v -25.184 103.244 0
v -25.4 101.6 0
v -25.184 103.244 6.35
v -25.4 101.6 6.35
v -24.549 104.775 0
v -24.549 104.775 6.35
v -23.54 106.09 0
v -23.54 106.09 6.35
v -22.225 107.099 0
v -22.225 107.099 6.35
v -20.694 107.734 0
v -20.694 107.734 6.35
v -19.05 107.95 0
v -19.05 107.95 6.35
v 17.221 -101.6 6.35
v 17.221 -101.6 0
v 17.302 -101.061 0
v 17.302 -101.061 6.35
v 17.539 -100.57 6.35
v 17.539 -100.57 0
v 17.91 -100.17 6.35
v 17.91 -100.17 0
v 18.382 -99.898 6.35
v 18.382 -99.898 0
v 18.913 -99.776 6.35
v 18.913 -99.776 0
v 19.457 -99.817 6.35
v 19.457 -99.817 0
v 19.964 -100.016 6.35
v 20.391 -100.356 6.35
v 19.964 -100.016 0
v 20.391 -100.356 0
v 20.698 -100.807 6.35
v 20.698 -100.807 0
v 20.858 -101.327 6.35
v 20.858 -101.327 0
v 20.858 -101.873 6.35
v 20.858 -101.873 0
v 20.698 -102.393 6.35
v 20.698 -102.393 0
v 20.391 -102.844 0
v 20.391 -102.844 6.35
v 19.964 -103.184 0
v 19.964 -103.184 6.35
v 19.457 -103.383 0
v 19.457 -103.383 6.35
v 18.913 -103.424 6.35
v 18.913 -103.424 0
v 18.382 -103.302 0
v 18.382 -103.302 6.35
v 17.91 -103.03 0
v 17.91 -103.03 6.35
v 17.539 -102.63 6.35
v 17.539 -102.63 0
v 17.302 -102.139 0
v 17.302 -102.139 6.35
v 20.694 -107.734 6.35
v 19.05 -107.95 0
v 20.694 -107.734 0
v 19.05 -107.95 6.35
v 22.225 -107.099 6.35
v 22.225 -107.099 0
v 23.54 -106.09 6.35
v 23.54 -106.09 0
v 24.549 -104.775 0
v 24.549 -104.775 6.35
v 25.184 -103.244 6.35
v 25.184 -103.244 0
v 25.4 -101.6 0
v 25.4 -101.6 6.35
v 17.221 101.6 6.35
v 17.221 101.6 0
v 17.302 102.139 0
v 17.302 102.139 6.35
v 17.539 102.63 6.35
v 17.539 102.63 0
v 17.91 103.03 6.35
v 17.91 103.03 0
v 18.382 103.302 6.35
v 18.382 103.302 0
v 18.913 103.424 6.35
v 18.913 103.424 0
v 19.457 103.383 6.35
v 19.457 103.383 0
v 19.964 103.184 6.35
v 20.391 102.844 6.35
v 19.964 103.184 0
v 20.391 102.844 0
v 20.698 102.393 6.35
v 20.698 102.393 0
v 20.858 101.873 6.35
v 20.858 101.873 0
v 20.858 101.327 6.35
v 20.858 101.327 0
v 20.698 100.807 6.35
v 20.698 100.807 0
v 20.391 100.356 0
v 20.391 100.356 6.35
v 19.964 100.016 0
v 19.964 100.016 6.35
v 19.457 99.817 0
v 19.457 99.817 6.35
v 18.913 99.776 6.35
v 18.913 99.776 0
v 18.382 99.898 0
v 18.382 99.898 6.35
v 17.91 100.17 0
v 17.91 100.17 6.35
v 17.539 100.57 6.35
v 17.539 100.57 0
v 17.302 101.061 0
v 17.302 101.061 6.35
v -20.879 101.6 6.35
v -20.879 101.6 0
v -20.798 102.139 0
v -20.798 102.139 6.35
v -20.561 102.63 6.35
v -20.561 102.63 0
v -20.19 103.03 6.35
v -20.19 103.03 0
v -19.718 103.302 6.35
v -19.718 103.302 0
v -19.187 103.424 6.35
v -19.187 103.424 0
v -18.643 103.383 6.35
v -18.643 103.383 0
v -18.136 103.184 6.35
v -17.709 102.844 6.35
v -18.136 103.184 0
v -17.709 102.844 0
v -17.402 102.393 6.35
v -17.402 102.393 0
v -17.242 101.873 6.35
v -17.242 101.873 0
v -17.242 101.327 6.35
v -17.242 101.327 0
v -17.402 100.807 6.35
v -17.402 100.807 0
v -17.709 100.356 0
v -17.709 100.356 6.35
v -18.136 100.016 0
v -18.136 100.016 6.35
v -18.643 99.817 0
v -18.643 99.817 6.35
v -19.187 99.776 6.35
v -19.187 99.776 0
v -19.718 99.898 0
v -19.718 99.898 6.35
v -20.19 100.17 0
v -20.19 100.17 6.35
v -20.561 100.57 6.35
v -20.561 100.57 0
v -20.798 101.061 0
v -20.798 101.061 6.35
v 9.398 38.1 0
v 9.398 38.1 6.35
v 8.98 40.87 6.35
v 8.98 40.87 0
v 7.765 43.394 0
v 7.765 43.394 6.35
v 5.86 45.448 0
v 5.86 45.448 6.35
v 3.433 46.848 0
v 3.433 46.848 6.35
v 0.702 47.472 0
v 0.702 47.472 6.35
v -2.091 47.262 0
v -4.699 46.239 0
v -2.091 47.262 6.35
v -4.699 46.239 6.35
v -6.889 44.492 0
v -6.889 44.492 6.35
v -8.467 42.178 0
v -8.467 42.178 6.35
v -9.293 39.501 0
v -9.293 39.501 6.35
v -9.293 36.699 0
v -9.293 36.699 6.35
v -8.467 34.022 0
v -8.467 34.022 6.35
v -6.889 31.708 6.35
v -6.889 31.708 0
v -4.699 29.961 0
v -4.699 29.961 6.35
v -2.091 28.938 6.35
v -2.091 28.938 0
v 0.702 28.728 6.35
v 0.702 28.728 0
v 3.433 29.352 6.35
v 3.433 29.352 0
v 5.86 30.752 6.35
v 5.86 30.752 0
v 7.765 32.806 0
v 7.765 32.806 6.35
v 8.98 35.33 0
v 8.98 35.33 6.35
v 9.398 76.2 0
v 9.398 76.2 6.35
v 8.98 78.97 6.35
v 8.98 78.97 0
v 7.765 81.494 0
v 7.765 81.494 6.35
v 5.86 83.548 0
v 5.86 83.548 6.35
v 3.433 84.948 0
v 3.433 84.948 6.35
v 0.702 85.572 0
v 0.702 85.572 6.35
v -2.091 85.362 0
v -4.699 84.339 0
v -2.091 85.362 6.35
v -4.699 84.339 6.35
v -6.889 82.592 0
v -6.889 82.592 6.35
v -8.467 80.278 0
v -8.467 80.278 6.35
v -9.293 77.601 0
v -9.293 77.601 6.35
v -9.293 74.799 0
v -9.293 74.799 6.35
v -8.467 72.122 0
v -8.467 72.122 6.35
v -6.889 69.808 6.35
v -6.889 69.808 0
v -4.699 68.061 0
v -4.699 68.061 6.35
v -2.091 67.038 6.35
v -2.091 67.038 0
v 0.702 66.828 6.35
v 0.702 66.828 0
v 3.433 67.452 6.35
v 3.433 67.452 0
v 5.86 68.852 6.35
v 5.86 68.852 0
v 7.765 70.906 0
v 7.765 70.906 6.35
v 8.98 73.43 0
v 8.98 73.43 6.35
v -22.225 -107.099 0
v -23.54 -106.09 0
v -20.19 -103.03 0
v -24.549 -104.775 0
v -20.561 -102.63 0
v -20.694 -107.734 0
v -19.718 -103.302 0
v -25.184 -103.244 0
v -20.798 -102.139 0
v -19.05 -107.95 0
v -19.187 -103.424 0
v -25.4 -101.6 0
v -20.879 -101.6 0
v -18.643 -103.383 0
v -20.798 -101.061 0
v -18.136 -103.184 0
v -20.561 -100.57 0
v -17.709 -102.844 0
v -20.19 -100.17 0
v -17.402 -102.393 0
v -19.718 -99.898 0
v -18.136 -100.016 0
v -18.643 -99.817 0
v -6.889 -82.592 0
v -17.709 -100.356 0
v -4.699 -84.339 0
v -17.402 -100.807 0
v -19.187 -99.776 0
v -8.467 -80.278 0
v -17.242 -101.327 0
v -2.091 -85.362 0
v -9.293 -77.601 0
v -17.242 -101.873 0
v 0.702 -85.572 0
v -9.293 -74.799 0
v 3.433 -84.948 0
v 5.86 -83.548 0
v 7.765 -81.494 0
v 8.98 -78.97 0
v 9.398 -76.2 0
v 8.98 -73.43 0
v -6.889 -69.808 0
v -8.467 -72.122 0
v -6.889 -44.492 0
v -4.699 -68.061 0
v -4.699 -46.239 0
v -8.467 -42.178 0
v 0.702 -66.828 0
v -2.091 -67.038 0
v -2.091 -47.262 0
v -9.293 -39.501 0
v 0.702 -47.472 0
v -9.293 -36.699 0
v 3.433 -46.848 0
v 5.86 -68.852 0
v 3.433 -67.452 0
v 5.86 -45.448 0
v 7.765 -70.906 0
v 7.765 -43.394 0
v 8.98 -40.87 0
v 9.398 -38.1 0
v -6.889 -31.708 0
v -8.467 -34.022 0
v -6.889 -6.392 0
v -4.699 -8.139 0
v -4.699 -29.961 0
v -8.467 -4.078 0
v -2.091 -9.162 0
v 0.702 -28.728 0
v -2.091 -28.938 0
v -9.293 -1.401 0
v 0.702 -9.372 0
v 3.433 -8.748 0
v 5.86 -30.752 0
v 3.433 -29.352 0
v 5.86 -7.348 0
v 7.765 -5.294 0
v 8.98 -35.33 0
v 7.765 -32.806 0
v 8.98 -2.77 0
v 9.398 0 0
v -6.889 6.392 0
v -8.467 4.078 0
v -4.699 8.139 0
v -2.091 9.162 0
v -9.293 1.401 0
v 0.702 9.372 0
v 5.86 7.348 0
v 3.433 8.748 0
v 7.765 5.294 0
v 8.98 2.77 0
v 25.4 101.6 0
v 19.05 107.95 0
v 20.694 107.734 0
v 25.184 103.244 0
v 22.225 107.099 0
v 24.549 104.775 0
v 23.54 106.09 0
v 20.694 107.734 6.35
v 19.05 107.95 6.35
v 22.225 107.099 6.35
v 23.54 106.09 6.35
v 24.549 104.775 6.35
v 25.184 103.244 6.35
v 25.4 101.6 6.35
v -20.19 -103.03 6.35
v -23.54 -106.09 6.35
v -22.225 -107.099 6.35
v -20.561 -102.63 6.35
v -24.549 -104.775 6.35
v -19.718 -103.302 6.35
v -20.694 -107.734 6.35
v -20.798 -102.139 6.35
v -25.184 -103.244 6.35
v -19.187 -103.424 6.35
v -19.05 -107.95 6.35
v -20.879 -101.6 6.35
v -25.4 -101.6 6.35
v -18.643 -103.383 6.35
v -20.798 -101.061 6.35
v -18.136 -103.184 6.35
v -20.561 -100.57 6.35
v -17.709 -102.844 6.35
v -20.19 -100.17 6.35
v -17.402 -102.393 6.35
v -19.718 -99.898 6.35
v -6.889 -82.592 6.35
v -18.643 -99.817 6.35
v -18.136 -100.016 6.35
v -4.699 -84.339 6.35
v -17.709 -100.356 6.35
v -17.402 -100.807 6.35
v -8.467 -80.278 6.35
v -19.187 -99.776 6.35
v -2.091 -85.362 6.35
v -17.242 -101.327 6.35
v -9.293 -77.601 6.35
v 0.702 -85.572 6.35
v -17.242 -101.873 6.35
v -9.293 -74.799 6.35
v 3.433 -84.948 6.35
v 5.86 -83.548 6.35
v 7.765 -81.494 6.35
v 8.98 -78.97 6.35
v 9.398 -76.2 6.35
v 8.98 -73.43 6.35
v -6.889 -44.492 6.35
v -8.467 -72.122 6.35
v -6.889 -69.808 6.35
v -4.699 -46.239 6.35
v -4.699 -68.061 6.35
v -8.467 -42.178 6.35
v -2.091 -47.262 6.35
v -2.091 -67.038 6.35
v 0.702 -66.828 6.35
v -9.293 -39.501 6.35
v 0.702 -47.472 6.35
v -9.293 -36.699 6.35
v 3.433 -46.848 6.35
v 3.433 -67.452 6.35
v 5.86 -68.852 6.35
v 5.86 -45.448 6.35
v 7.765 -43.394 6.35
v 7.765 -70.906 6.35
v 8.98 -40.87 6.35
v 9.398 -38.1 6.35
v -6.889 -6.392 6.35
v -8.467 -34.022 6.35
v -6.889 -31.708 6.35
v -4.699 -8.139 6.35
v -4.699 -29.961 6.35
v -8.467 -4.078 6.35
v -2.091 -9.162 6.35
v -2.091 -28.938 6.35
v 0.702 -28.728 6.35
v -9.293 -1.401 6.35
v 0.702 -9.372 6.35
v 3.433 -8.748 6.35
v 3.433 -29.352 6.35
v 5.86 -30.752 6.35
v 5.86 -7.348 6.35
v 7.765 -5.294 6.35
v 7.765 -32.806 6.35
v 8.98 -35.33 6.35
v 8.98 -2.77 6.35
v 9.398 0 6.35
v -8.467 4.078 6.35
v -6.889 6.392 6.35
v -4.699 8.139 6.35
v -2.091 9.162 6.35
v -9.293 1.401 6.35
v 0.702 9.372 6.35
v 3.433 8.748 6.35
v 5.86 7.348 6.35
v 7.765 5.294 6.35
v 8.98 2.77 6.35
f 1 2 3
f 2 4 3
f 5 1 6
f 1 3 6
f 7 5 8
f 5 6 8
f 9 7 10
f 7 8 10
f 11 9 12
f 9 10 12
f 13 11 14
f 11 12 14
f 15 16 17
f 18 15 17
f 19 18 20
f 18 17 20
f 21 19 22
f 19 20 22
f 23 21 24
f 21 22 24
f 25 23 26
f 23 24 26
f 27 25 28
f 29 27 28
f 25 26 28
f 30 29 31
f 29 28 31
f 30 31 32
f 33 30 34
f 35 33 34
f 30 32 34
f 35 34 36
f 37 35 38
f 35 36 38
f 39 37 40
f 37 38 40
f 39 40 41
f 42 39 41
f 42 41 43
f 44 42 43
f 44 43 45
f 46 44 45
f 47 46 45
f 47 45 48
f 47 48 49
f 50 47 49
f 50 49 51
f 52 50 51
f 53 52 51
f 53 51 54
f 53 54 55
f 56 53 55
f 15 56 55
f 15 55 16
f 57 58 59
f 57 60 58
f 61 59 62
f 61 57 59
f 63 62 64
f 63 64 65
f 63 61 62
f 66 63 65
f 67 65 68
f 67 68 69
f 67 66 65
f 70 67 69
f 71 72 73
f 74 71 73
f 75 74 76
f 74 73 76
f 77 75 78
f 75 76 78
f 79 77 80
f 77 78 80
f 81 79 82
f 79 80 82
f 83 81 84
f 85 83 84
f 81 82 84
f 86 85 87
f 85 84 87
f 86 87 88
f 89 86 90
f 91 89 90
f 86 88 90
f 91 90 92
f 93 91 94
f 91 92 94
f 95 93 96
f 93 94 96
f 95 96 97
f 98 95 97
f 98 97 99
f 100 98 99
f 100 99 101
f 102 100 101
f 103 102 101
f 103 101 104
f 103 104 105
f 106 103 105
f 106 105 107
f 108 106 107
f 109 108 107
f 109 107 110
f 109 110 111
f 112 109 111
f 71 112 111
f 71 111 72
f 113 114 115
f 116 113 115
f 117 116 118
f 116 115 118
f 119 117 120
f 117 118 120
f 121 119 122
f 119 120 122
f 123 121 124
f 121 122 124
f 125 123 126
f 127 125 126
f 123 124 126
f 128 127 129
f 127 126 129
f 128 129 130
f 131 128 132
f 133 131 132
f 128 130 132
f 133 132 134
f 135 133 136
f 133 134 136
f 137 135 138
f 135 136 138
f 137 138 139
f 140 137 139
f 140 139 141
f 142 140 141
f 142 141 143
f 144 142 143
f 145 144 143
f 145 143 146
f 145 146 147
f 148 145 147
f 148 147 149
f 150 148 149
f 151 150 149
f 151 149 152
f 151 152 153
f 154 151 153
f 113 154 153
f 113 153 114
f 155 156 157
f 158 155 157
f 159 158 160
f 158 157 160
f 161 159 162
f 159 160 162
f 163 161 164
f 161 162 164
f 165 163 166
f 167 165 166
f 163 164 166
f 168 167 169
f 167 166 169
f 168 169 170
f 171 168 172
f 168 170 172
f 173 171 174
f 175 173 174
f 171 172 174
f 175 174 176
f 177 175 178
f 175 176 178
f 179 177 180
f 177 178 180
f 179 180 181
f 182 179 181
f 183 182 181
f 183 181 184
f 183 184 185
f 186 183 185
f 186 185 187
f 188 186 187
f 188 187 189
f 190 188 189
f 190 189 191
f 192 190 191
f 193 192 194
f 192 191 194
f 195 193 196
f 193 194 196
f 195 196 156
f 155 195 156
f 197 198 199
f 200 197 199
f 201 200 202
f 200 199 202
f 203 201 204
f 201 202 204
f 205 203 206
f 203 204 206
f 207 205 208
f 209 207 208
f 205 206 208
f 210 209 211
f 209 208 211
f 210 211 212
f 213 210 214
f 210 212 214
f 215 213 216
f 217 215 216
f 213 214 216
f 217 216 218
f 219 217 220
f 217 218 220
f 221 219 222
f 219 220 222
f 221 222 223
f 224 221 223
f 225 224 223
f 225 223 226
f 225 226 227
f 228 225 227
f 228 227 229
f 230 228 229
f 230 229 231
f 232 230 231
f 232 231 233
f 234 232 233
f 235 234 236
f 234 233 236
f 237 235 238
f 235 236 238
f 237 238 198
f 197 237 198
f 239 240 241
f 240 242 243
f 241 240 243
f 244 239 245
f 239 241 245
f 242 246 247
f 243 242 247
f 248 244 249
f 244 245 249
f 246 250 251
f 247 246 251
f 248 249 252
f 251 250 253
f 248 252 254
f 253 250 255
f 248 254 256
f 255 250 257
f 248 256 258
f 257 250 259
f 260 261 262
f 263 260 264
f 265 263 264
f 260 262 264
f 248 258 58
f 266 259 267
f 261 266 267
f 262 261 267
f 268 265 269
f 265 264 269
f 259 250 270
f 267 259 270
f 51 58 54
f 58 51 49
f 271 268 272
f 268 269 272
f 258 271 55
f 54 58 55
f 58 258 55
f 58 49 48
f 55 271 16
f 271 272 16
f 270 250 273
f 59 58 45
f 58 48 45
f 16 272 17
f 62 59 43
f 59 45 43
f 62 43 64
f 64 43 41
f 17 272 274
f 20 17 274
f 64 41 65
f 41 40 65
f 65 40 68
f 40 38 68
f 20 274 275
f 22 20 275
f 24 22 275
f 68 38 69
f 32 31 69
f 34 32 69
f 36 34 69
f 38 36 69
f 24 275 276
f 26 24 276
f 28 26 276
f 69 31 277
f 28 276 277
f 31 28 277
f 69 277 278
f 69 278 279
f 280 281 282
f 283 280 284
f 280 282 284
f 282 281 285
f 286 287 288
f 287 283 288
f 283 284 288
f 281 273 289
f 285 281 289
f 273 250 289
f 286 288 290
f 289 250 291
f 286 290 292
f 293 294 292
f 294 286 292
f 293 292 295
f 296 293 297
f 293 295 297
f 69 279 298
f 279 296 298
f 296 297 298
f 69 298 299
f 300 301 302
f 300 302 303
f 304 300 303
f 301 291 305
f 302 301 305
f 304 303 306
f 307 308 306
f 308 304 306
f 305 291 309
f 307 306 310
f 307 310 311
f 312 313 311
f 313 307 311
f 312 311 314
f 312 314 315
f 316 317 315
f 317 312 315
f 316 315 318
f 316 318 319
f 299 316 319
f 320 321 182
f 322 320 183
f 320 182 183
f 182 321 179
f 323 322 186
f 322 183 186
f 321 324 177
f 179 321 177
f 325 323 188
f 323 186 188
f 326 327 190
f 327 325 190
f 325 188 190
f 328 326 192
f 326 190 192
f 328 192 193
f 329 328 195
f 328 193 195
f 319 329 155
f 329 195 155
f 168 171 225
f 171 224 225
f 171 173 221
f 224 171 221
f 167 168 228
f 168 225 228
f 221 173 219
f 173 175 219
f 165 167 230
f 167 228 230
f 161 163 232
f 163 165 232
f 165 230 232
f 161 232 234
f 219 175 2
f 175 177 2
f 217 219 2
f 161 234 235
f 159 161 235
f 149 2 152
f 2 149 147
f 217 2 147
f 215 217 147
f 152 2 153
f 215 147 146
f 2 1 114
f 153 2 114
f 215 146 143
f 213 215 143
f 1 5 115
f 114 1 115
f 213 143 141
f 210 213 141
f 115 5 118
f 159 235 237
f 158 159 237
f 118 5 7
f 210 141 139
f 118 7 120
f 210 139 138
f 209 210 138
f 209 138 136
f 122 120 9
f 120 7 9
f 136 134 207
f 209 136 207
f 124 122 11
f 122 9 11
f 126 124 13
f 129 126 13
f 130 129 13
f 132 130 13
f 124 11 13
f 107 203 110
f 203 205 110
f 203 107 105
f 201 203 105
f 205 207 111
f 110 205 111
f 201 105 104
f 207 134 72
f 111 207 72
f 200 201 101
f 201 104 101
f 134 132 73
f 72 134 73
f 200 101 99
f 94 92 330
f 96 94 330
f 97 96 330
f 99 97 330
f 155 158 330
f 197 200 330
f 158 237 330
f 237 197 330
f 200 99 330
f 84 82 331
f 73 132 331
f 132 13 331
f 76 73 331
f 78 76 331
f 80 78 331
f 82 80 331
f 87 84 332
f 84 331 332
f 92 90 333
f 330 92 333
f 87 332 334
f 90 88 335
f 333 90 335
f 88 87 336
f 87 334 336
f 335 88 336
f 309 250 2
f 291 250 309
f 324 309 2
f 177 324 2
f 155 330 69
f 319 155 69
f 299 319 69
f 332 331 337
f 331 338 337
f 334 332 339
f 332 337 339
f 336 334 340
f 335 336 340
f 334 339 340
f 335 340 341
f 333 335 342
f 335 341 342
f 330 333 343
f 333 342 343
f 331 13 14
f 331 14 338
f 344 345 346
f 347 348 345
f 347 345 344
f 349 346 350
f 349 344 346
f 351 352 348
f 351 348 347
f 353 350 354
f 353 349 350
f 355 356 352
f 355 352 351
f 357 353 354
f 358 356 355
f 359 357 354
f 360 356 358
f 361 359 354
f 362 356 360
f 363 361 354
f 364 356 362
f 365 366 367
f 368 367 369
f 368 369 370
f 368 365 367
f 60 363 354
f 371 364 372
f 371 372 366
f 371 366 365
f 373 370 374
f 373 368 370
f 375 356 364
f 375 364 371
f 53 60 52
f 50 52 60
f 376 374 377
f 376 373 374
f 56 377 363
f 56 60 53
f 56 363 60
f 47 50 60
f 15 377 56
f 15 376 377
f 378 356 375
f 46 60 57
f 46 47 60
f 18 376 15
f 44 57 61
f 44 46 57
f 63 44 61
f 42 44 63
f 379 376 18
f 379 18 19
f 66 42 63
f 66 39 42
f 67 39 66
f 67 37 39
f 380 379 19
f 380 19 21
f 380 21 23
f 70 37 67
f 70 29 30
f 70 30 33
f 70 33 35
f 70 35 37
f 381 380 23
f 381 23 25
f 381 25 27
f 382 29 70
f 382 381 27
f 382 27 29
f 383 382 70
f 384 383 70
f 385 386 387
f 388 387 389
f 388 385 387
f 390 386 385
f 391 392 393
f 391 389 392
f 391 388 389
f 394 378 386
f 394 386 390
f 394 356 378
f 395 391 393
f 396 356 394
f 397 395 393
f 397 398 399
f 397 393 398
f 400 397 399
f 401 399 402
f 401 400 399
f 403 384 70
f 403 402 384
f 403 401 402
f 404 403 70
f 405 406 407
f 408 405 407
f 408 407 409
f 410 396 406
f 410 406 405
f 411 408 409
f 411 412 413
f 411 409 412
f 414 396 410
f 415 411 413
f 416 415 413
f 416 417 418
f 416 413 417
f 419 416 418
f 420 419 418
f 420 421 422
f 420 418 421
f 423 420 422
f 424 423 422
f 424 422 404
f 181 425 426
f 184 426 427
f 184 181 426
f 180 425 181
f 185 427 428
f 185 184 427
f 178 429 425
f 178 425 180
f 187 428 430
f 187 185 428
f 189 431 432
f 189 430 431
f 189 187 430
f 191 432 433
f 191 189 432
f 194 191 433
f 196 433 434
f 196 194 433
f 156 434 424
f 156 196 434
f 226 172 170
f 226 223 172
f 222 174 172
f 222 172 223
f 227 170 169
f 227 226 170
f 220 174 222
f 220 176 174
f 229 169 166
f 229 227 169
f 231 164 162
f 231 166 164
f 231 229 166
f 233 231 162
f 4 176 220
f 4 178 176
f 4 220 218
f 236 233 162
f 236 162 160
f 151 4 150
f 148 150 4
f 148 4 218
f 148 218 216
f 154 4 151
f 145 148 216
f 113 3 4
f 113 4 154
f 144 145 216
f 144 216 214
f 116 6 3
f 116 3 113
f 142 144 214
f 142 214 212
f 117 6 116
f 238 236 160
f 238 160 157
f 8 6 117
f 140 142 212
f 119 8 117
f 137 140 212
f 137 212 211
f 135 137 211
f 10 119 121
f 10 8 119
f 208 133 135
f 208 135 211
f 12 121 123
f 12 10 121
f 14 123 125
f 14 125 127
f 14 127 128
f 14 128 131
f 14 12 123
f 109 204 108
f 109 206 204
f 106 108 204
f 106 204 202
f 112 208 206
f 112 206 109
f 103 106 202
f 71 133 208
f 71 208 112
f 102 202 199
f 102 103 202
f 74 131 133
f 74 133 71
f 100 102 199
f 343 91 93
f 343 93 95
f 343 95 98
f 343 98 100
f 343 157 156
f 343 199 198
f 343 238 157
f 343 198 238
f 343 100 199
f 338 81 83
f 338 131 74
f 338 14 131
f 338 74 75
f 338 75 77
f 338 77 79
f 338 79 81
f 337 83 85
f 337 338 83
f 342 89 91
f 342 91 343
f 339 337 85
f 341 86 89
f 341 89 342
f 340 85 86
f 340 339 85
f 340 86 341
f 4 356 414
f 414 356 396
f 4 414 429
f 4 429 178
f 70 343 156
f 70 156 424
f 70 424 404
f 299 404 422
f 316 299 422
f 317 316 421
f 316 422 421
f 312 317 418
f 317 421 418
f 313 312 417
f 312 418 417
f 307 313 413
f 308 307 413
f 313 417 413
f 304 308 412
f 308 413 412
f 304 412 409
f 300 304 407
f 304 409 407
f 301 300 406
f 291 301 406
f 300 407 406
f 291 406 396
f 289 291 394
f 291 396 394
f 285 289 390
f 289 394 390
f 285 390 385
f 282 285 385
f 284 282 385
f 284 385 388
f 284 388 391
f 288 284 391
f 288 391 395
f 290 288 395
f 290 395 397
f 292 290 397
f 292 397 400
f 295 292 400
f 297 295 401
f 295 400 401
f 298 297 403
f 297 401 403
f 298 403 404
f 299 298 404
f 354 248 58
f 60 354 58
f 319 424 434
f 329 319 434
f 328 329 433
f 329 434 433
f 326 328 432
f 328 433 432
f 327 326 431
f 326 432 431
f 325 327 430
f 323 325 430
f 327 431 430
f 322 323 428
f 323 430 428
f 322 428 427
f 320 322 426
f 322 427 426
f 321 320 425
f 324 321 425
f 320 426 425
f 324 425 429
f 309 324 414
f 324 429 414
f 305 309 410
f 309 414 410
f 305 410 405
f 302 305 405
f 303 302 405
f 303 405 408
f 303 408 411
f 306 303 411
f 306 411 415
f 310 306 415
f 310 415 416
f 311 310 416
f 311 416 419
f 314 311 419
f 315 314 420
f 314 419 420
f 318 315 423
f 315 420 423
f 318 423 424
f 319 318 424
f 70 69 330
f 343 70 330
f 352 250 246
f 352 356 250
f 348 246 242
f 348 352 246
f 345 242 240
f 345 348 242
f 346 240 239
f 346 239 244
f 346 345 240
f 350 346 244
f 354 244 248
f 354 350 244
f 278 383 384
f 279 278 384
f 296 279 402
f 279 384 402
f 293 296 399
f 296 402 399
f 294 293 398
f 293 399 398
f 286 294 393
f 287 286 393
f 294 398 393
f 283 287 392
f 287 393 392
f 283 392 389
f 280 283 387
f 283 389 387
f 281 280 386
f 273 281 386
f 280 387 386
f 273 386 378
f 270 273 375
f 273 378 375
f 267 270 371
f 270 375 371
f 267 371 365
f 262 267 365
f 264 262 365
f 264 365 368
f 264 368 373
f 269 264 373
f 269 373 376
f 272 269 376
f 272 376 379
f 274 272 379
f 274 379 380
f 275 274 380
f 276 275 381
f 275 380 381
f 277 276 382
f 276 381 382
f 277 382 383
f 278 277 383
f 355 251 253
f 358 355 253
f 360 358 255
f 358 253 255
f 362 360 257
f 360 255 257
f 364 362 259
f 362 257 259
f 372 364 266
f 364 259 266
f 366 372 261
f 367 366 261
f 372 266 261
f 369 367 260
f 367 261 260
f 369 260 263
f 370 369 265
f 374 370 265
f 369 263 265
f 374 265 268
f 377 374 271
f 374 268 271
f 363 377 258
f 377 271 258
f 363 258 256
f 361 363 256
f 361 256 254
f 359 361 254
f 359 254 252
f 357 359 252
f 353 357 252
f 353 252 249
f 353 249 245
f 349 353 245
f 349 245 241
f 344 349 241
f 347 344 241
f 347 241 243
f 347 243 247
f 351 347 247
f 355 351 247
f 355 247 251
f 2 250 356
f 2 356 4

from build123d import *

# Parameters (mm, degrees)
SKETCH1_W             = 50.8
SKETCH1_H             = 215.9
BOSS_EXTRUDE1_DEPTH   = 6.35
SKETCH2_R             = 9.398
CUT_EXTRUDE1_DEPTH    = 6.35
LPATTERN1_COUNT       = 3
LPATTERN1_PITCH       = 38.1
LPATTERN1_COL_COUNT   = 3
LPATTERN1_COL_PITCH   = 38.1
F_6_CLEARANCE_HOLE1_D = 3.6576
FILLET1_R             = 6.35


with BuildPart() as part:
    # Sketch1 → Boss-Extrude1 (new body)
    with BuildSketch(Plane.XY):
        Rectangle(SKETCH1_W, SKETCH1_H)
    extrude(amount=BOSS_EXTRUDE1_DEPTH)

    # Sketch2 → Cut-Extrude1 (cut)
    with BuildSketch(Plane.XY.offset(6.35)):
        Circle(SKETCH2_R)
    cut_extrude1 = extrude(amount=-CUT_EXTRUDE1_DEPTH, mode=Mode.SUBTRACT)

    # LPattern1: Cut-Extrude1 ×3
    with Locations(*[(0, -i * LPATTERN1_PITCH, 0) for i in range(1, LPATTERN1_COUNT)]):
        add(cut_extrude1, mode=Mode.SUBTRACT)

    # LPattern1 col: Cut-Extrude1 ×3
    with Locations(*[(0, i * LPATTERN1_COL_PITCH, 0) for i in range(1, LPATTERN1_COL_COUNT)]):
        add(cut_extrude1, mode=Mode.SUBTRACT)

    # #6 Clearance Hole1 (through all)
    with Locations(Plane.XY.offset(6.35)):
        with Locations((19.05, -101.6), (0, 0), (19.05, 101.6), (-19.05, -101.6), (-19.05, 101.6)):
            Hole(F_6_CLEARANCE_HOLE1_D / 2)

    # Fillet1
    fillet1_edges = [part.edges().sort_by_distance(p)[0] for p in [
        (25.4, -107.95, 3.175),
        (-25.4, -107.95, 3.175),
        (-25.4, 107.95, 3.175),
        (25.4, 107.95, 3.175),
    ]]
    fillet(fillet1_edges, radius=FILLET1_R)


solid = part.part
